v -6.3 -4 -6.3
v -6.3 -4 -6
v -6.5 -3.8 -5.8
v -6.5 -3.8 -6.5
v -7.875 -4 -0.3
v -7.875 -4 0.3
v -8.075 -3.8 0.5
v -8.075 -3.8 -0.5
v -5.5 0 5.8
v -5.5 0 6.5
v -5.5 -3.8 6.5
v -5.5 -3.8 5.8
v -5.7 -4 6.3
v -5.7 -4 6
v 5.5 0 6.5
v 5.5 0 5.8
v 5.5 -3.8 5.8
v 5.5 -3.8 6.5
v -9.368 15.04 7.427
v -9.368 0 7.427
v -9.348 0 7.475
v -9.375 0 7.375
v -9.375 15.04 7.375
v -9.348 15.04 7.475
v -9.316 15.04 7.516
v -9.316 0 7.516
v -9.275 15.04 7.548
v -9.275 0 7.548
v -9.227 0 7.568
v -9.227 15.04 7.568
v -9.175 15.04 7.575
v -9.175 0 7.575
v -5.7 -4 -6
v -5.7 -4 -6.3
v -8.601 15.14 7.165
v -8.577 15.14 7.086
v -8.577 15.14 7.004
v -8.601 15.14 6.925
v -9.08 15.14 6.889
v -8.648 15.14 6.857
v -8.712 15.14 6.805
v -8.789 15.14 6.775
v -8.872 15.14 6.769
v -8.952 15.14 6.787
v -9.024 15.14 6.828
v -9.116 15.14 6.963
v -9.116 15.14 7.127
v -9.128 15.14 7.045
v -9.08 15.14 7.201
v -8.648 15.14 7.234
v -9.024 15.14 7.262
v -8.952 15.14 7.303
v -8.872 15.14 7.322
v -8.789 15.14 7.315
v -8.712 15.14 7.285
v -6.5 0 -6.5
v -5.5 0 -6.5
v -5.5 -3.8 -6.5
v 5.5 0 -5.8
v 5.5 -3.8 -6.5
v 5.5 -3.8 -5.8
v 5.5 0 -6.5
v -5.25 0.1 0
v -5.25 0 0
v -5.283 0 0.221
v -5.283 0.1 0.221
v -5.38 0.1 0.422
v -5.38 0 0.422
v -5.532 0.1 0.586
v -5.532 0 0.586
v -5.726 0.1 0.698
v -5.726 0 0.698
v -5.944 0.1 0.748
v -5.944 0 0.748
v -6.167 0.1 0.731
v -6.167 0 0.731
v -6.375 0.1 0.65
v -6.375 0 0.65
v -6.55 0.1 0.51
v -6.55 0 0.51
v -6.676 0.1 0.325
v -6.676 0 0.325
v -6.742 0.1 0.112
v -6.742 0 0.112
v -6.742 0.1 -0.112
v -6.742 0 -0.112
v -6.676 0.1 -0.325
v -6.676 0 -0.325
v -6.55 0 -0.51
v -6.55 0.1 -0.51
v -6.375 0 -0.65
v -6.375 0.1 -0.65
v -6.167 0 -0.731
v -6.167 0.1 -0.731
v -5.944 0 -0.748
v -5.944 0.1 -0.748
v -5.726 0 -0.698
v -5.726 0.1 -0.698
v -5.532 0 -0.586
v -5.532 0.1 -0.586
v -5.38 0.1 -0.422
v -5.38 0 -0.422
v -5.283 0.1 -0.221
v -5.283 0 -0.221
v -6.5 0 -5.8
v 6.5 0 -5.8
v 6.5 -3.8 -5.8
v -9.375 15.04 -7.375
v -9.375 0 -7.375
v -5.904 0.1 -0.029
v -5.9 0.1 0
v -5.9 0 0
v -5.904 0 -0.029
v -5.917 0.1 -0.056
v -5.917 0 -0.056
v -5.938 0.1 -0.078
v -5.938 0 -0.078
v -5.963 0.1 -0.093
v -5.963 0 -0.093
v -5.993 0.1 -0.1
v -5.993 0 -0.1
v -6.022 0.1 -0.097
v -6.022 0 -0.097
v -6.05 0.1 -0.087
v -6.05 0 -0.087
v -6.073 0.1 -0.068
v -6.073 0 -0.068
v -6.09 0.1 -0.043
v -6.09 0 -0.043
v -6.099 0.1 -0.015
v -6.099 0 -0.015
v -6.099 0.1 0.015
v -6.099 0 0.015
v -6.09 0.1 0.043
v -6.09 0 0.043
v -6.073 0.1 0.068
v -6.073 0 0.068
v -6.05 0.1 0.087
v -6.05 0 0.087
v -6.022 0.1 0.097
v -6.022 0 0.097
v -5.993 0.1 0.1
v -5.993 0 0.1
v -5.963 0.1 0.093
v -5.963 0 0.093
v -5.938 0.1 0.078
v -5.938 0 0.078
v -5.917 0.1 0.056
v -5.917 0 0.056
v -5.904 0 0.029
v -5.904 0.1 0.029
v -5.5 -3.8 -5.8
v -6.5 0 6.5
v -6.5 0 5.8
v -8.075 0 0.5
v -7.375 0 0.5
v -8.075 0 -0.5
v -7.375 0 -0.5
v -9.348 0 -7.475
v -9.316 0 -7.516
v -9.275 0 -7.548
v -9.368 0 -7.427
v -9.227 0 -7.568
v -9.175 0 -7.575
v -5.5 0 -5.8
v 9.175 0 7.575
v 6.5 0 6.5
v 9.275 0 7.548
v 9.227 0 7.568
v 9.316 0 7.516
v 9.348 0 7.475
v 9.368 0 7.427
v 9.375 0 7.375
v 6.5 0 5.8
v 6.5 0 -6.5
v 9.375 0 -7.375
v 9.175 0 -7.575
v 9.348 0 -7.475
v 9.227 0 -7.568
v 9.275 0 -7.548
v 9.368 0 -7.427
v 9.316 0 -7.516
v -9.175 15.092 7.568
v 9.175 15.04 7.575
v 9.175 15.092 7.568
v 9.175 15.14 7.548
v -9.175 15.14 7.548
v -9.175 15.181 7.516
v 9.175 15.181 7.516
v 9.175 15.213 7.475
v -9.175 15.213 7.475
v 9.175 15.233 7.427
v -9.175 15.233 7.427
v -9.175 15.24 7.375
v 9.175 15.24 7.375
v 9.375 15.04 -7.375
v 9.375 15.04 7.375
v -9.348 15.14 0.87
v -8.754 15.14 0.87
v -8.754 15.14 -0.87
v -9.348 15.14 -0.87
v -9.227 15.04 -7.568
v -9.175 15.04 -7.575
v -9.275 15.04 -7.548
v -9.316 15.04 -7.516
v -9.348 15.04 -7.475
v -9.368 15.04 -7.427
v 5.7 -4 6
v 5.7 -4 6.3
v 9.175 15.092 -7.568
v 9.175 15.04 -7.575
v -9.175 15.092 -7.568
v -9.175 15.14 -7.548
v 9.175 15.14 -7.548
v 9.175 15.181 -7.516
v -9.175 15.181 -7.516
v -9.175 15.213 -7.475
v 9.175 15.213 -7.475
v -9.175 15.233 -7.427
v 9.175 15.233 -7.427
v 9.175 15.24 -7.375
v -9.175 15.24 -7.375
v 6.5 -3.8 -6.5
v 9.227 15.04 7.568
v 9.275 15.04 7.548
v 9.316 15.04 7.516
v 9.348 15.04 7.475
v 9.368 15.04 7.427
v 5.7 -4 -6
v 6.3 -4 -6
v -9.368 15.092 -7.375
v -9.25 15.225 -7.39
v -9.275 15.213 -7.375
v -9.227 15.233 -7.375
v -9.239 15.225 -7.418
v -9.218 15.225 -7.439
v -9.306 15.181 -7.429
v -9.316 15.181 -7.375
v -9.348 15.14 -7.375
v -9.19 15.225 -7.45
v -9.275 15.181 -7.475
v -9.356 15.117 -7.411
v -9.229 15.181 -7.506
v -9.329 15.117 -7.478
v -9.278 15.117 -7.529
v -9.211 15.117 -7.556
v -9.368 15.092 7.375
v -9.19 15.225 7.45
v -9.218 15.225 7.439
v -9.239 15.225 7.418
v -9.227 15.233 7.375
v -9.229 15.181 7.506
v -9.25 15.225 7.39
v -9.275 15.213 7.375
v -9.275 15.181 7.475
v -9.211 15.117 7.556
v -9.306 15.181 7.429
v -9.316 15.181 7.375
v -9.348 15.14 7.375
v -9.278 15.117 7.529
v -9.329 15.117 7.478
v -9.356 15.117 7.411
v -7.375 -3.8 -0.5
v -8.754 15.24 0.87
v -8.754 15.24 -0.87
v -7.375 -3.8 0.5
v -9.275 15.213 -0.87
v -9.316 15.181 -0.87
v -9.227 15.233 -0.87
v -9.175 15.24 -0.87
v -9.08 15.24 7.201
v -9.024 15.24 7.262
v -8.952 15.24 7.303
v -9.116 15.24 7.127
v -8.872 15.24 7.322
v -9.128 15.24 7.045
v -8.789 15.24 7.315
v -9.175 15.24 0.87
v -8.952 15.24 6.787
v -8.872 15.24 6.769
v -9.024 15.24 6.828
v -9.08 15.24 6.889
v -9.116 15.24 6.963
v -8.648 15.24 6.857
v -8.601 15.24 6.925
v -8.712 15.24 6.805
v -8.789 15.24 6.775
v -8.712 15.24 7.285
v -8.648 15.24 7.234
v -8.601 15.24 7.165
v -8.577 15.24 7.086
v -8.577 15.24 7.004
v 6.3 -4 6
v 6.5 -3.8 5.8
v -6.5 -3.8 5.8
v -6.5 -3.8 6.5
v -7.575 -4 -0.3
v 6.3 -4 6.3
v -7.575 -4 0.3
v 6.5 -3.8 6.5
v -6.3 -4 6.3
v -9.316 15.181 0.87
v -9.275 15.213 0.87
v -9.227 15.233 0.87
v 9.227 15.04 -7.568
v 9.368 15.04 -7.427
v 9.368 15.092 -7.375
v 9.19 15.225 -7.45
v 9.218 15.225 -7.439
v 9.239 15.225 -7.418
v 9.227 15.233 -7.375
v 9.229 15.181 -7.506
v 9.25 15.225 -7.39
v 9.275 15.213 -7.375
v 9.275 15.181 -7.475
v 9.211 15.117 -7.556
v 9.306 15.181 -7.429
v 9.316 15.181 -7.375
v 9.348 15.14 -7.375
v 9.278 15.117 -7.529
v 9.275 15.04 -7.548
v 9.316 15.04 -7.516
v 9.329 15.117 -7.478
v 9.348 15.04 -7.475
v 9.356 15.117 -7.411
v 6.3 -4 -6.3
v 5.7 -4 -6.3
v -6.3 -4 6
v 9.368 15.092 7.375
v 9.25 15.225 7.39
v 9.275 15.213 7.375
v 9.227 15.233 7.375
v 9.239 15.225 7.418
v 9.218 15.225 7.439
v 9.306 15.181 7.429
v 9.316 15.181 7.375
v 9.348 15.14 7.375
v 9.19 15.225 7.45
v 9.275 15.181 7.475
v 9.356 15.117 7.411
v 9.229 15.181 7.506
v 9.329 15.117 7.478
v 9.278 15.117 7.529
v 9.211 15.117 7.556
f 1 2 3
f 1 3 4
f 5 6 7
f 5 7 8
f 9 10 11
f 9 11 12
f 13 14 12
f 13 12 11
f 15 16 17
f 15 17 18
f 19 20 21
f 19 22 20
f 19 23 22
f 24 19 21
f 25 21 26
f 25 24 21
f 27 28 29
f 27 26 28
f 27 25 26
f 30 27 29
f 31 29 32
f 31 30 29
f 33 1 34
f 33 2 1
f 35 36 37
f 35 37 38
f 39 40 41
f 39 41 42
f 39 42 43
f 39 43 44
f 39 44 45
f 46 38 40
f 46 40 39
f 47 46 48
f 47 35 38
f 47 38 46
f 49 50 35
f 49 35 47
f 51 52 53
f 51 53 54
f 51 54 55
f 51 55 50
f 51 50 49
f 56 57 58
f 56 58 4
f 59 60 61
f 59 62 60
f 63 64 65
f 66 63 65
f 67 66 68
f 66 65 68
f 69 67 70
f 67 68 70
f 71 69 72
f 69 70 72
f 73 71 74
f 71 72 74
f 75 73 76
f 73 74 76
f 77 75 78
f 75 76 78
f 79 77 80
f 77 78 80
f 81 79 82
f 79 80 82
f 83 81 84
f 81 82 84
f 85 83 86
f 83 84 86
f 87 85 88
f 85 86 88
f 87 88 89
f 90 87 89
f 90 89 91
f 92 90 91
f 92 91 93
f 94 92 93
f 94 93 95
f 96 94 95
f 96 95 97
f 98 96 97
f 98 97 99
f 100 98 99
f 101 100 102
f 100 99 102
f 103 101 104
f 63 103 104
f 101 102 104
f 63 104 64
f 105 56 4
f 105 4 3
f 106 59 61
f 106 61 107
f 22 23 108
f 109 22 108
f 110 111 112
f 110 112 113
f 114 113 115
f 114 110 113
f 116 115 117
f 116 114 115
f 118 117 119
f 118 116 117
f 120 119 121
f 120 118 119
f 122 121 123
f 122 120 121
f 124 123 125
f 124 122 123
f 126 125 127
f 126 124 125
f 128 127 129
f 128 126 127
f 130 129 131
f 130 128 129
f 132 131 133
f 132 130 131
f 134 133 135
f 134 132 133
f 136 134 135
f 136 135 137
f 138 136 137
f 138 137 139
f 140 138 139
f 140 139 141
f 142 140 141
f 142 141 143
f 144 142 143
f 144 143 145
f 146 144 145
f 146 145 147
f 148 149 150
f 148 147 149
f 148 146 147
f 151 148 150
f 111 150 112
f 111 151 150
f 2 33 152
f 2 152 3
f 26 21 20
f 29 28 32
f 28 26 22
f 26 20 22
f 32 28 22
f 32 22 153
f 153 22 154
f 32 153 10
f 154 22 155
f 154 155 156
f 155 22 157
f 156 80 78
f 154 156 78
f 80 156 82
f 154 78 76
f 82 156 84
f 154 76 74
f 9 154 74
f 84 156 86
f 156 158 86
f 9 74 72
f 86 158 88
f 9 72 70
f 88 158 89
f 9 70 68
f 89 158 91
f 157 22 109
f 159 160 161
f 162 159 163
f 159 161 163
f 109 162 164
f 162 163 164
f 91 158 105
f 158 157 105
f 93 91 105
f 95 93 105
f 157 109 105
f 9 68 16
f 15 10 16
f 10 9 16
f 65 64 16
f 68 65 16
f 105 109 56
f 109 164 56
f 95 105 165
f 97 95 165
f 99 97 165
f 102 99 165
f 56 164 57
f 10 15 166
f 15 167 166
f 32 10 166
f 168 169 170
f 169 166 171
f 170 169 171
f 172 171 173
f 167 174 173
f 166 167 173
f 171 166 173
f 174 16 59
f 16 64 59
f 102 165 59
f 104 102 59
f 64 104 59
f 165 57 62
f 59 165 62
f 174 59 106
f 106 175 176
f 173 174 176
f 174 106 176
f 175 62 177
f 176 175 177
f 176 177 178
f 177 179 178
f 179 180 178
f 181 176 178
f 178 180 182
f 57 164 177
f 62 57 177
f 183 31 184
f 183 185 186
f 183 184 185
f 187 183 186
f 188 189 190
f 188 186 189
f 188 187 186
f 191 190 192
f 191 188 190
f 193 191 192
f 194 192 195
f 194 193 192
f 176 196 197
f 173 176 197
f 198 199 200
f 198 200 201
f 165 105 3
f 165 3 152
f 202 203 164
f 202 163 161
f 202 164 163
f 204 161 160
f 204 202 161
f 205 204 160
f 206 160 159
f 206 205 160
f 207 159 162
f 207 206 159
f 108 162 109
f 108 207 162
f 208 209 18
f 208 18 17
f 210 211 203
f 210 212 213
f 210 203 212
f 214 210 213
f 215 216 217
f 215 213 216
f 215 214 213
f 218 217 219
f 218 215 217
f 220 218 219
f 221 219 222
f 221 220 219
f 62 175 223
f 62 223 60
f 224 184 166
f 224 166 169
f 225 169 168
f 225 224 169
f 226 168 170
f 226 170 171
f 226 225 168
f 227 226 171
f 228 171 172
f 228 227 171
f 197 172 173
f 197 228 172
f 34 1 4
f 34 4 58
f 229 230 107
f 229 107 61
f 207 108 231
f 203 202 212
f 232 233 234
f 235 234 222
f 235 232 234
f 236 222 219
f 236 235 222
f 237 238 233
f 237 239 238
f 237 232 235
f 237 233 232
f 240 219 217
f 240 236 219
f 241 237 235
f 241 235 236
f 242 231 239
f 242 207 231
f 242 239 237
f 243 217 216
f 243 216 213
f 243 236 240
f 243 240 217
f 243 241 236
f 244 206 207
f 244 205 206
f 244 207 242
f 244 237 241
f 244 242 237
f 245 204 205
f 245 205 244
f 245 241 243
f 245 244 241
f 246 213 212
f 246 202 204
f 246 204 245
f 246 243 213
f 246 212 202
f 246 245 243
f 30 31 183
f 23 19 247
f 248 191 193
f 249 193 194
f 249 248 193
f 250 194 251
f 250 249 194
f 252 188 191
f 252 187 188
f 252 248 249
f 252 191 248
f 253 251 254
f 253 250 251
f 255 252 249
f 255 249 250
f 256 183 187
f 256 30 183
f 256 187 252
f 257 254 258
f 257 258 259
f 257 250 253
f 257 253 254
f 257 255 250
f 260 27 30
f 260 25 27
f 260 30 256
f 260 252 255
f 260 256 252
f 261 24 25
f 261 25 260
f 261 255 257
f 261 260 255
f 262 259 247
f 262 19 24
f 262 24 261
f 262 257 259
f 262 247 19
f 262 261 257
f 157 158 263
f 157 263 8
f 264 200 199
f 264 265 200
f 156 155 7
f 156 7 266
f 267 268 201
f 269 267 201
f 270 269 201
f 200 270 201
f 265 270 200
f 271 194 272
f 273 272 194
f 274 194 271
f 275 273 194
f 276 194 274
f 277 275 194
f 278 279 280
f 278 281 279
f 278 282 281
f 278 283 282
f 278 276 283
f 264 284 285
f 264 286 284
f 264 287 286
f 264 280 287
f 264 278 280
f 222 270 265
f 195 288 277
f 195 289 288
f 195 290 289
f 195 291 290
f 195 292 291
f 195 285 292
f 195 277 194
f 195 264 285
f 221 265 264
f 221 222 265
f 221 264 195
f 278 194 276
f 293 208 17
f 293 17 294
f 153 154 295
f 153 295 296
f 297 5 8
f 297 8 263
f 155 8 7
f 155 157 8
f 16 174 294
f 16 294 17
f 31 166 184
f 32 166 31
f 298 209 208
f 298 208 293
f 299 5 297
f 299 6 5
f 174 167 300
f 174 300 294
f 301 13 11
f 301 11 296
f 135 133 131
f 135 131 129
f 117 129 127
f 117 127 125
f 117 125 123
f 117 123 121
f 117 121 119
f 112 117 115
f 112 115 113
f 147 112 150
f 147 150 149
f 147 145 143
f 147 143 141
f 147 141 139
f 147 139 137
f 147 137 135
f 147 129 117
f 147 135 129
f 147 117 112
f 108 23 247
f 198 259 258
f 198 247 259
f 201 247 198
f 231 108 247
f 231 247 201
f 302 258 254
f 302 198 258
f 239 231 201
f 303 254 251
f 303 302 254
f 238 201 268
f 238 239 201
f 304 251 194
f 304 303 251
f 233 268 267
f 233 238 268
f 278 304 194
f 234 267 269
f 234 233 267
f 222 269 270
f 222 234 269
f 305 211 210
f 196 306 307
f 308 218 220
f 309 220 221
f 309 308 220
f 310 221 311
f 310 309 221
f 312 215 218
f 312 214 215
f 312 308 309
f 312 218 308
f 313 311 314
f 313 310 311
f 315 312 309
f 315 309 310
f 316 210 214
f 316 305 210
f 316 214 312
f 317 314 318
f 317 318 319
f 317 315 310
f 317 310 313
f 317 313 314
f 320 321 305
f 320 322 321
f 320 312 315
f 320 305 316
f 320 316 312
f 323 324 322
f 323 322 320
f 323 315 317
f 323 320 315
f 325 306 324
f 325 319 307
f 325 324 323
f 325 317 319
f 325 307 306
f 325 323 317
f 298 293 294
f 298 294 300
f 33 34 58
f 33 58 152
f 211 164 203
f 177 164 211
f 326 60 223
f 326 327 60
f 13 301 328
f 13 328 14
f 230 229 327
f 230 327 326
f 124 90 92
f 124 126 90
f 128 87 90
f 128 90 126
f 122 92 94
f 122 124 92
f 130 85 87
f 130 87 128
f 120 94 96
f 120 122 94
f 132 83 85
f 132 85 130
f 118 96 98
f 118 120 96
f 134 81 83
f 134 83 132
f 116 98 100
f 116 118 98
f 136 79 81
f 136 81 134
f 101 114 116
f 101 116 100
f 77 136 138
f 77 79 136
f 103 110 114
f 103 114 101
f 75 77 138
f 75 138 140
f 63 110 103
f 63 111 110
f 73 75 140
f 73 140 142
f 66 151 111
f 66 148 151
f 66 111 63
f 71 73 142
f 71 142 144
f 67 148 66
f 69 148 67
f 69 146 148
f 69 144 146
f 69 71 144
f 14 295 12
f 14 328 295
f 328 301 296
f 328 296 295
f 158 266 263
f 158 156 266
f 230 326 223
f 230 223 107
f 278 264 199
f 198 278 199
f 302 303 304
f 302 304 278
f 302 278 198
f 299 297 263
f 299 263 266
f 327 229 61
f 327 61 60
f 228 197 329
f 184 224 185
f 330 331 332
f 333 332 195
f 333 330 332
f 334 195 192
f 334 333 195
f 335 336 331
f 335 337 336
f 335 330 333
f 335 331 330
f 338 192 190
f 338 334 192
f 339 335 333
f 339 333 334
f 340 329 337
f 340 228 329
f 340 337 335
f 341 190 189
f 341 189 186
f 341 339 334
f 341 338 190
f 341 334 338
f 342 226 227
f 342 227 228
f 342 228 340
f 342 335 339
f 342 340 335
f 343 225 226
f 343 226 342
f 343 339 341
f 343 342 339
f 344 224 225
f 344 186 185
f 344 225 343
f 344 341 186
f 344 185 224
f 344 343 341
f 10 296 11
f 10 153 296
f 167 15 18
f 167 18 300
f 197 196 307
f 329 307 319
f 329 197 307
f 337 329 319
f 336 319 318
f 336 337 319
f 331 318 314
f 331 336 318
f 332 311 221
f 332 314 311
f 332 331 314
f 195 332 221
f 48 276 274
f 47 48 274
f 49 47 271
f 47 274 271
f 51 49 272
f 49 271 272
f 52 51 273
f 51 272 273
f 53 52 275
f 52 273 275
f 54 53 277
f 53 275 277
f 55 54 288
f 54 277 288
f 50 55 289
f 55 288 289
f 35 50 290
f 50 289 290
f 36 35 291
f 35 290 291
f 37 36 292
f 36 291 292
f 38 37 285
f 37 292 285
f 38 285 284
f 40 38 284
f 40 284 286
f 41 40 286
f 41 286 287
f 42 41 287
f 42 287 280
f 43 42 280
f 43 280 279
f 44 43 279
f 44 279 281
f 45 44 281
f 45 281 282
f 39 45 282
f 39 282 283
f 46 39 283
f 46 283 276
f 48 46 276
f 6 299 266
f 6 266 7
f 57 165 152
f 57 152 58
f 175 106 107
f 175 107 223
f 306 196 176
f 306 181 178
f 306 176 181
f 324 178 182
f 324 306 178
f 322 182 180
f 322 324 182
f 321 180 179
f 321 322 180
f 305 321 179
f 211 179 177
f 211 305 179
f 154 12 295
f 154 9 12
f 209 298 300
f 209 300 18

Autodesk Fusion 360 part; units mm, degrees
sketch "Sketch1" plane through (0, 0, 0) normal (0, 1, 0) x (1, 0, 0)
  line L0 (9.375, -7.575) -> (-9.375, -7.575)
  line L1 (-9.375, -7.575) -> (-9.375, 7.575)
  line L2 (-9.375, 7.575) -> (9.375, 7.575)
  line L3 (9.375, 7.575) -> (9.375, -7.575)
  line L4 (9.375, -7.575) -> (-9.375, 7.575) construction
  line L5 (-9.375, -7.575) -> (9.375, 7.575) construction
  dimension "d1" = 15.15
  dimension "d2" = 18.75
extrude "Extrude1" add sketch "Sketch1" along normal blind 15.24
fillet "Fillet1" radius 0.2 4 edges at (9.375, 7.62, 7.575) (-9.375, 7.62, 7.575) (-9.375, 7.62, -7.575) (9.375, 7.62, -7.575) 1 faces at (3.125, 15.24, 2.525)
sketch "Sketch2" plane through (0, 0, 0) normal (0, -1, 0) x (1, 0, 0)
  arc A0 (-9.375, -7.375) -> (-9.175, -7.575) centre (-9.175, -7.375) ccw
  line L0 (-9.175, -7.575) -> (9.175, -7.575)
  arc A1 (9.175, -7.575) -> (9.375, -7.375) centre (9.175, -7.375) ccw
  line L1 (9.375, -7.375) -> (9.375, 7.375)
  arc A2 (9.375, 7.375) -> (9.175, 7.575) centre (9.175, 7.375) ccw
  line L2 (9.175, 7.575) -> (-9.175, 7.575)
  arc A3 (-9.175, 7.575) -> (-9.375, 7.375) centre (-9.175, 7.375) ccw
  line L3 (-9.375, 7.375) -> (-9.375, -7.375)
  line L4 (6.5, -6.5) -> (-6.5, -6.5) construction
  line L5 (-6.5, -6.5) -> (-6.5, 6.5) construction
  line L6 (-6.5, 6.5) -> (6.5, 6.5) construction
  line L7 (6.5, 6.5) -> (6.5, -6.5) construction
  line L8 (6.5, -6.5) -> (-6.5, 6.5) construction
  line L9 (-6.5, -6.5) -> (6.5, 6.5) construction
  line L10 (-6.5, 6.5) -> (-5.5, 6.5)
  line L11 (-5.5, 6.5) -> (-5.5, 5.8)
  line L12 (-5.5, 5.8) -> (-6.5, 5.8)
  line L13 (-6.5, 5.8) -> (-6.5, 6.5)
  line L14 (6.5, 5.8) -> (5.5, 5.8)
  line L15 (5.5, 6.5) -> (6.5, 6.5)
  line L16 (5.5, 5.8) -> (5.5, 6.5)
  line L17 (6.5, 6.5) -> (6.5, 5.8)
  line L18 (-5.5, -6.5) -> (-6.5, -6.5)
  line L19 (-6.5, -5.8) -> (-5.5, -5.8)
  line L20 (-6.5, -6.5) -> (-6.5, -5.8)
  line L21 (-5.5, -5.8) -> (-5.5, -6.5)
  line L22 (6.5, -6.5) -> (5.5, -6.5)
  line L23 (5.5, -5.8) -> (6.5, -5.8)
  line L24 (5.5, -6.5) -> (5.5, -5.8)
  line L25 (6.5, -5.8) -> (6.5, -6.5)
  dimension "d7" = 13
  dimension "d8" = 13
  dimension "d9" = 1
  dimension "d10" = 0.7
  dimension "d13" = 12
  dimension "d14" = -12.3
extrude "Extrude2" add sketch "Sketch2" along normal blind 4 contours L10 L11 L12 L13 | L14 L15 L16 L17 | L18 L19 L20 L21 | L22 L23 L24 L25
chamfer "Chamfer1" distance 0.2 angle 45 8 edges at (5.5, -4, 6.15) (6, -4, 6.5) (6.5, -4, 6.15) (6, -4, 5.8) (6, -4, -5.8) (6.5, -4, -6.15) (6, -4, -6.5) (5.5, -4, -6.15) 2 faces at (-6.1667, -4, 6.2667) (-5.8333, -4, -6.2667)
sketch "Sketch3" plane through (0, 0, 0) normal (0, -1, 0) x (1, 0, 0)
  line L0 (6.5, -5.8) -> (6.5, -6.5)
  line L1 (6.5, -6.5) -> (5.5, -6.5)
  line L2 (5.5, -6.5) -> (5.5, -5.8)
  line L3 (5.5, -5.8) -> (6.5, -5.8)
  line L4 (-6.5, 5.8) -> (-6.5, 6.5)
  line L5 (-6.5, 6.5) -> (-5.5, 6.5)
  line L6 (-5.5, 6.5) -> (-5.5, 5.8)
  line L7 (-5.5, 5.8) -> (-6.5, 5.8)
  line L8 (-5.5, -5.8) -> (-5.5, -6.5)
  line L9 (-5.5, -6.5) -> (-6.5, -6.5)
  line L10 (-6.5, -6.5) -> (-6.5, -5.8)
  line L11 (-6.5, -5.8) -> (-5.5, -5.8)
  line L12 (6.5, 6.5) -> (6.5, 5.8)
  line L13 (6.5, 5.8) -> (5.5, 5.8)
  line L14 (5.5, 5.8) -> (5.5, 6.5)
  line L15 (5.5, 6.5) -> (6.5, 6.5)
  arc A0 (-9.375, -7.375) -> (-9.175, -7.575) centre (-9.175, -7.375) ccw
  line L16 (-9.175, -7.575) -> (9.175, -7.575)
  arc A1 (9.175, -7.575) -> (9.375, -7.375) centre (9.175, -7.375) ccw
  line L17 (9.375, -7.375) -> (9.375, 7.375)
  arc A2 (9.375, 7.375) -> (9.175, 7.575) centre (9.175, 7.375) ccw
  line L18 (9.175, 7.575) -> (-9.175, 7.575)
  arc A3 (-9.175, 7.575) -> (-9.375, 7.375) centre (-9.175, 7.375) ccw
  line L19 (-9.375, 7.375) -> (-9.375, -7.375)
  line L20 (0, 0) -> (-9.375, 0) construction
  line L21 (-7.375, -0.5) -> (-8.075, -0.5)
  line L22 (-8.075, -0.5) -> (-8.075, 0.5)
  line L23 (-8.075, 0.5) -> (-7.375, 0.5)
  line L24 (-7.375, 0.5) -> (-7.375, -0.5)
  line L25 (-7.375, -0.5) -> (-8.075, 0.5) construction
  line L26 (-8.075, -0.5) -> (-7.375, 0.5) construction
  point P0 (-7.725, 0)
  dimension "d20" = 0.7
  dimension "d21" = 1
extrude "Extrude3" add sketch "Sketch3" along normal blind 4 contours L21 L22 L23 L24
chamfer "Chamfer2" distance 0.2 angle 45 4 edges at (-7.725, -4, -0.5) (-8.075, -4, 0) (-7.725, -4, 0.5) (-7.375, -4, 0)
sketch "Sketch4" plane through (0, 0, 0) normal (0, -1, 0) x (1, 0, 0)
  line L0 (-7.375, 0.5) -> (-7.375, -0.5)
  line L1 (-7.375, -0.5) -> (-8.075, -0.5)
  line L2 (-8.075, -0.5) -> (-8.075, 0.5)
  line L3 (-8.075, 0.5) -> (-7.375, 0.5)
  line L4 (6.5, -5.8) -> (6.5, -6.5)
  line L5 (6.5, -6.5) -> (5.5, -6.5)
  line L6 (5.5, -6.5) -> (5.5, -5.8)
  line L7 (5.5, -5.8) -> (6.5, -5.8)
  line L8 (-6.5, 5.8) -> (-6.5, 6.5)
  line L9 (-6.5, 6.5) -> (-5.5, 6.5)
  line L10 (-5.5, 6.5) -> (-5.5, 5.8)
  line L11 (-5.5, 5.8) -> (-6.5, 5.8)
  line L12 (-5.5, -5.8) -> (-5.5, -6.5)
  line L13 (-5.5, -6.5) -> (-6.5, -6.5)
  line L14 (-6.5, -6.5) -> (-6.5, -5.8)
  line L15 (-6.5, -5.8) -> (-5.5, -5.8)
  line L16 (6.5, 6.5) -> (6.5, 5.8)
  line L17 (6.5, 5.8) -> (5.5, 5.8)
  line L18 (5.5, 5.8) -> (5.5, 6.5)
  line L19 (5.5, 6.5) -> (6.5, 6.5)
  arc A0 (-9.375, -7.375) -> (-9.175, -7.575) centre (-9.175, -7.375) ccw
  line L20 (-9.175, -7.575) -> (9.175, -7.575)
  arc A1 (9.175, -7.575) -> (9.375, -7.375) centre (9.175, -7.375) ccw
  line L21 (9.375, -7.375) -> (9.375, 7.375)
  arc A2 (9.375, 7.375) -> (9.175, 7.575) centre (9.175, 7.375) ccw
  line L22 (9.175, 7.575) -> (-9.175, 7.575)
  arc A3 (-9.175, 7.575) -> (-9.375, 7.375) centre (-9.175, 7.375) ccw
  line L23 (-9.375, 7.375) -> (-9.375, -7.375)
  circle A4 centre (-6, 0) radius 0.75
  dimension "d25" = 1.5
extrude "Extrude4" cut sketch "Sketch4" against normal blind 0.1 contours A4
sketch "Sketch5" plane through (0, 0.1, 0) normal (0, -1, 0) x (1, 0, 0)
  circle A0 centre (-6, 0) radius 0.75
  circle A1 centre (-6, 0) radius 0.1
extrude "Extrude5" add sketch "Sketch5" along normal blind 0.1 contours A1
sketch "Sketch6" plane through (0, 15.24, 0) normal (0, 1, 0) x (-1, 0, 0)
  line L0 (-9.175, -7.375) -> (9.175, -7.375)
  line L1 (9.175, -7.375) -> (9.175, 7.375)
  line L2 (9.175, 7.375) -> (-9.175, 7.375)
  line L3 (-9.175, 7.375) -> (-9.175, -7.375)
  line L4 (8.7536, 0.8698) -> (9.5964, 0.8698)
  line L5 (9.5964, 0.8698) -> (9.5964, -0.8698)
  line L6 (9.5964, -0.8698) -> (8.7536, -0.8698)
  line L7 (8.7536, -0.8698) -> (8.7536, 0.8698)
  line L8 (8.7536, 0.8698) -> (9.5964, -0.8698) construction
  line L9 (9.5964, 0.8698) -> (8.7536, -0.8698) construction
  circle A0 centre (8.8509, 7.0451) radius 0.2772
  point P0 (9.175, 0)
extrude "Extrude6" cut sketch "Sketch6" against normal blind 0.1 contours L1 L4 L6 L7 | L1 L4 L5 L6 | A0
